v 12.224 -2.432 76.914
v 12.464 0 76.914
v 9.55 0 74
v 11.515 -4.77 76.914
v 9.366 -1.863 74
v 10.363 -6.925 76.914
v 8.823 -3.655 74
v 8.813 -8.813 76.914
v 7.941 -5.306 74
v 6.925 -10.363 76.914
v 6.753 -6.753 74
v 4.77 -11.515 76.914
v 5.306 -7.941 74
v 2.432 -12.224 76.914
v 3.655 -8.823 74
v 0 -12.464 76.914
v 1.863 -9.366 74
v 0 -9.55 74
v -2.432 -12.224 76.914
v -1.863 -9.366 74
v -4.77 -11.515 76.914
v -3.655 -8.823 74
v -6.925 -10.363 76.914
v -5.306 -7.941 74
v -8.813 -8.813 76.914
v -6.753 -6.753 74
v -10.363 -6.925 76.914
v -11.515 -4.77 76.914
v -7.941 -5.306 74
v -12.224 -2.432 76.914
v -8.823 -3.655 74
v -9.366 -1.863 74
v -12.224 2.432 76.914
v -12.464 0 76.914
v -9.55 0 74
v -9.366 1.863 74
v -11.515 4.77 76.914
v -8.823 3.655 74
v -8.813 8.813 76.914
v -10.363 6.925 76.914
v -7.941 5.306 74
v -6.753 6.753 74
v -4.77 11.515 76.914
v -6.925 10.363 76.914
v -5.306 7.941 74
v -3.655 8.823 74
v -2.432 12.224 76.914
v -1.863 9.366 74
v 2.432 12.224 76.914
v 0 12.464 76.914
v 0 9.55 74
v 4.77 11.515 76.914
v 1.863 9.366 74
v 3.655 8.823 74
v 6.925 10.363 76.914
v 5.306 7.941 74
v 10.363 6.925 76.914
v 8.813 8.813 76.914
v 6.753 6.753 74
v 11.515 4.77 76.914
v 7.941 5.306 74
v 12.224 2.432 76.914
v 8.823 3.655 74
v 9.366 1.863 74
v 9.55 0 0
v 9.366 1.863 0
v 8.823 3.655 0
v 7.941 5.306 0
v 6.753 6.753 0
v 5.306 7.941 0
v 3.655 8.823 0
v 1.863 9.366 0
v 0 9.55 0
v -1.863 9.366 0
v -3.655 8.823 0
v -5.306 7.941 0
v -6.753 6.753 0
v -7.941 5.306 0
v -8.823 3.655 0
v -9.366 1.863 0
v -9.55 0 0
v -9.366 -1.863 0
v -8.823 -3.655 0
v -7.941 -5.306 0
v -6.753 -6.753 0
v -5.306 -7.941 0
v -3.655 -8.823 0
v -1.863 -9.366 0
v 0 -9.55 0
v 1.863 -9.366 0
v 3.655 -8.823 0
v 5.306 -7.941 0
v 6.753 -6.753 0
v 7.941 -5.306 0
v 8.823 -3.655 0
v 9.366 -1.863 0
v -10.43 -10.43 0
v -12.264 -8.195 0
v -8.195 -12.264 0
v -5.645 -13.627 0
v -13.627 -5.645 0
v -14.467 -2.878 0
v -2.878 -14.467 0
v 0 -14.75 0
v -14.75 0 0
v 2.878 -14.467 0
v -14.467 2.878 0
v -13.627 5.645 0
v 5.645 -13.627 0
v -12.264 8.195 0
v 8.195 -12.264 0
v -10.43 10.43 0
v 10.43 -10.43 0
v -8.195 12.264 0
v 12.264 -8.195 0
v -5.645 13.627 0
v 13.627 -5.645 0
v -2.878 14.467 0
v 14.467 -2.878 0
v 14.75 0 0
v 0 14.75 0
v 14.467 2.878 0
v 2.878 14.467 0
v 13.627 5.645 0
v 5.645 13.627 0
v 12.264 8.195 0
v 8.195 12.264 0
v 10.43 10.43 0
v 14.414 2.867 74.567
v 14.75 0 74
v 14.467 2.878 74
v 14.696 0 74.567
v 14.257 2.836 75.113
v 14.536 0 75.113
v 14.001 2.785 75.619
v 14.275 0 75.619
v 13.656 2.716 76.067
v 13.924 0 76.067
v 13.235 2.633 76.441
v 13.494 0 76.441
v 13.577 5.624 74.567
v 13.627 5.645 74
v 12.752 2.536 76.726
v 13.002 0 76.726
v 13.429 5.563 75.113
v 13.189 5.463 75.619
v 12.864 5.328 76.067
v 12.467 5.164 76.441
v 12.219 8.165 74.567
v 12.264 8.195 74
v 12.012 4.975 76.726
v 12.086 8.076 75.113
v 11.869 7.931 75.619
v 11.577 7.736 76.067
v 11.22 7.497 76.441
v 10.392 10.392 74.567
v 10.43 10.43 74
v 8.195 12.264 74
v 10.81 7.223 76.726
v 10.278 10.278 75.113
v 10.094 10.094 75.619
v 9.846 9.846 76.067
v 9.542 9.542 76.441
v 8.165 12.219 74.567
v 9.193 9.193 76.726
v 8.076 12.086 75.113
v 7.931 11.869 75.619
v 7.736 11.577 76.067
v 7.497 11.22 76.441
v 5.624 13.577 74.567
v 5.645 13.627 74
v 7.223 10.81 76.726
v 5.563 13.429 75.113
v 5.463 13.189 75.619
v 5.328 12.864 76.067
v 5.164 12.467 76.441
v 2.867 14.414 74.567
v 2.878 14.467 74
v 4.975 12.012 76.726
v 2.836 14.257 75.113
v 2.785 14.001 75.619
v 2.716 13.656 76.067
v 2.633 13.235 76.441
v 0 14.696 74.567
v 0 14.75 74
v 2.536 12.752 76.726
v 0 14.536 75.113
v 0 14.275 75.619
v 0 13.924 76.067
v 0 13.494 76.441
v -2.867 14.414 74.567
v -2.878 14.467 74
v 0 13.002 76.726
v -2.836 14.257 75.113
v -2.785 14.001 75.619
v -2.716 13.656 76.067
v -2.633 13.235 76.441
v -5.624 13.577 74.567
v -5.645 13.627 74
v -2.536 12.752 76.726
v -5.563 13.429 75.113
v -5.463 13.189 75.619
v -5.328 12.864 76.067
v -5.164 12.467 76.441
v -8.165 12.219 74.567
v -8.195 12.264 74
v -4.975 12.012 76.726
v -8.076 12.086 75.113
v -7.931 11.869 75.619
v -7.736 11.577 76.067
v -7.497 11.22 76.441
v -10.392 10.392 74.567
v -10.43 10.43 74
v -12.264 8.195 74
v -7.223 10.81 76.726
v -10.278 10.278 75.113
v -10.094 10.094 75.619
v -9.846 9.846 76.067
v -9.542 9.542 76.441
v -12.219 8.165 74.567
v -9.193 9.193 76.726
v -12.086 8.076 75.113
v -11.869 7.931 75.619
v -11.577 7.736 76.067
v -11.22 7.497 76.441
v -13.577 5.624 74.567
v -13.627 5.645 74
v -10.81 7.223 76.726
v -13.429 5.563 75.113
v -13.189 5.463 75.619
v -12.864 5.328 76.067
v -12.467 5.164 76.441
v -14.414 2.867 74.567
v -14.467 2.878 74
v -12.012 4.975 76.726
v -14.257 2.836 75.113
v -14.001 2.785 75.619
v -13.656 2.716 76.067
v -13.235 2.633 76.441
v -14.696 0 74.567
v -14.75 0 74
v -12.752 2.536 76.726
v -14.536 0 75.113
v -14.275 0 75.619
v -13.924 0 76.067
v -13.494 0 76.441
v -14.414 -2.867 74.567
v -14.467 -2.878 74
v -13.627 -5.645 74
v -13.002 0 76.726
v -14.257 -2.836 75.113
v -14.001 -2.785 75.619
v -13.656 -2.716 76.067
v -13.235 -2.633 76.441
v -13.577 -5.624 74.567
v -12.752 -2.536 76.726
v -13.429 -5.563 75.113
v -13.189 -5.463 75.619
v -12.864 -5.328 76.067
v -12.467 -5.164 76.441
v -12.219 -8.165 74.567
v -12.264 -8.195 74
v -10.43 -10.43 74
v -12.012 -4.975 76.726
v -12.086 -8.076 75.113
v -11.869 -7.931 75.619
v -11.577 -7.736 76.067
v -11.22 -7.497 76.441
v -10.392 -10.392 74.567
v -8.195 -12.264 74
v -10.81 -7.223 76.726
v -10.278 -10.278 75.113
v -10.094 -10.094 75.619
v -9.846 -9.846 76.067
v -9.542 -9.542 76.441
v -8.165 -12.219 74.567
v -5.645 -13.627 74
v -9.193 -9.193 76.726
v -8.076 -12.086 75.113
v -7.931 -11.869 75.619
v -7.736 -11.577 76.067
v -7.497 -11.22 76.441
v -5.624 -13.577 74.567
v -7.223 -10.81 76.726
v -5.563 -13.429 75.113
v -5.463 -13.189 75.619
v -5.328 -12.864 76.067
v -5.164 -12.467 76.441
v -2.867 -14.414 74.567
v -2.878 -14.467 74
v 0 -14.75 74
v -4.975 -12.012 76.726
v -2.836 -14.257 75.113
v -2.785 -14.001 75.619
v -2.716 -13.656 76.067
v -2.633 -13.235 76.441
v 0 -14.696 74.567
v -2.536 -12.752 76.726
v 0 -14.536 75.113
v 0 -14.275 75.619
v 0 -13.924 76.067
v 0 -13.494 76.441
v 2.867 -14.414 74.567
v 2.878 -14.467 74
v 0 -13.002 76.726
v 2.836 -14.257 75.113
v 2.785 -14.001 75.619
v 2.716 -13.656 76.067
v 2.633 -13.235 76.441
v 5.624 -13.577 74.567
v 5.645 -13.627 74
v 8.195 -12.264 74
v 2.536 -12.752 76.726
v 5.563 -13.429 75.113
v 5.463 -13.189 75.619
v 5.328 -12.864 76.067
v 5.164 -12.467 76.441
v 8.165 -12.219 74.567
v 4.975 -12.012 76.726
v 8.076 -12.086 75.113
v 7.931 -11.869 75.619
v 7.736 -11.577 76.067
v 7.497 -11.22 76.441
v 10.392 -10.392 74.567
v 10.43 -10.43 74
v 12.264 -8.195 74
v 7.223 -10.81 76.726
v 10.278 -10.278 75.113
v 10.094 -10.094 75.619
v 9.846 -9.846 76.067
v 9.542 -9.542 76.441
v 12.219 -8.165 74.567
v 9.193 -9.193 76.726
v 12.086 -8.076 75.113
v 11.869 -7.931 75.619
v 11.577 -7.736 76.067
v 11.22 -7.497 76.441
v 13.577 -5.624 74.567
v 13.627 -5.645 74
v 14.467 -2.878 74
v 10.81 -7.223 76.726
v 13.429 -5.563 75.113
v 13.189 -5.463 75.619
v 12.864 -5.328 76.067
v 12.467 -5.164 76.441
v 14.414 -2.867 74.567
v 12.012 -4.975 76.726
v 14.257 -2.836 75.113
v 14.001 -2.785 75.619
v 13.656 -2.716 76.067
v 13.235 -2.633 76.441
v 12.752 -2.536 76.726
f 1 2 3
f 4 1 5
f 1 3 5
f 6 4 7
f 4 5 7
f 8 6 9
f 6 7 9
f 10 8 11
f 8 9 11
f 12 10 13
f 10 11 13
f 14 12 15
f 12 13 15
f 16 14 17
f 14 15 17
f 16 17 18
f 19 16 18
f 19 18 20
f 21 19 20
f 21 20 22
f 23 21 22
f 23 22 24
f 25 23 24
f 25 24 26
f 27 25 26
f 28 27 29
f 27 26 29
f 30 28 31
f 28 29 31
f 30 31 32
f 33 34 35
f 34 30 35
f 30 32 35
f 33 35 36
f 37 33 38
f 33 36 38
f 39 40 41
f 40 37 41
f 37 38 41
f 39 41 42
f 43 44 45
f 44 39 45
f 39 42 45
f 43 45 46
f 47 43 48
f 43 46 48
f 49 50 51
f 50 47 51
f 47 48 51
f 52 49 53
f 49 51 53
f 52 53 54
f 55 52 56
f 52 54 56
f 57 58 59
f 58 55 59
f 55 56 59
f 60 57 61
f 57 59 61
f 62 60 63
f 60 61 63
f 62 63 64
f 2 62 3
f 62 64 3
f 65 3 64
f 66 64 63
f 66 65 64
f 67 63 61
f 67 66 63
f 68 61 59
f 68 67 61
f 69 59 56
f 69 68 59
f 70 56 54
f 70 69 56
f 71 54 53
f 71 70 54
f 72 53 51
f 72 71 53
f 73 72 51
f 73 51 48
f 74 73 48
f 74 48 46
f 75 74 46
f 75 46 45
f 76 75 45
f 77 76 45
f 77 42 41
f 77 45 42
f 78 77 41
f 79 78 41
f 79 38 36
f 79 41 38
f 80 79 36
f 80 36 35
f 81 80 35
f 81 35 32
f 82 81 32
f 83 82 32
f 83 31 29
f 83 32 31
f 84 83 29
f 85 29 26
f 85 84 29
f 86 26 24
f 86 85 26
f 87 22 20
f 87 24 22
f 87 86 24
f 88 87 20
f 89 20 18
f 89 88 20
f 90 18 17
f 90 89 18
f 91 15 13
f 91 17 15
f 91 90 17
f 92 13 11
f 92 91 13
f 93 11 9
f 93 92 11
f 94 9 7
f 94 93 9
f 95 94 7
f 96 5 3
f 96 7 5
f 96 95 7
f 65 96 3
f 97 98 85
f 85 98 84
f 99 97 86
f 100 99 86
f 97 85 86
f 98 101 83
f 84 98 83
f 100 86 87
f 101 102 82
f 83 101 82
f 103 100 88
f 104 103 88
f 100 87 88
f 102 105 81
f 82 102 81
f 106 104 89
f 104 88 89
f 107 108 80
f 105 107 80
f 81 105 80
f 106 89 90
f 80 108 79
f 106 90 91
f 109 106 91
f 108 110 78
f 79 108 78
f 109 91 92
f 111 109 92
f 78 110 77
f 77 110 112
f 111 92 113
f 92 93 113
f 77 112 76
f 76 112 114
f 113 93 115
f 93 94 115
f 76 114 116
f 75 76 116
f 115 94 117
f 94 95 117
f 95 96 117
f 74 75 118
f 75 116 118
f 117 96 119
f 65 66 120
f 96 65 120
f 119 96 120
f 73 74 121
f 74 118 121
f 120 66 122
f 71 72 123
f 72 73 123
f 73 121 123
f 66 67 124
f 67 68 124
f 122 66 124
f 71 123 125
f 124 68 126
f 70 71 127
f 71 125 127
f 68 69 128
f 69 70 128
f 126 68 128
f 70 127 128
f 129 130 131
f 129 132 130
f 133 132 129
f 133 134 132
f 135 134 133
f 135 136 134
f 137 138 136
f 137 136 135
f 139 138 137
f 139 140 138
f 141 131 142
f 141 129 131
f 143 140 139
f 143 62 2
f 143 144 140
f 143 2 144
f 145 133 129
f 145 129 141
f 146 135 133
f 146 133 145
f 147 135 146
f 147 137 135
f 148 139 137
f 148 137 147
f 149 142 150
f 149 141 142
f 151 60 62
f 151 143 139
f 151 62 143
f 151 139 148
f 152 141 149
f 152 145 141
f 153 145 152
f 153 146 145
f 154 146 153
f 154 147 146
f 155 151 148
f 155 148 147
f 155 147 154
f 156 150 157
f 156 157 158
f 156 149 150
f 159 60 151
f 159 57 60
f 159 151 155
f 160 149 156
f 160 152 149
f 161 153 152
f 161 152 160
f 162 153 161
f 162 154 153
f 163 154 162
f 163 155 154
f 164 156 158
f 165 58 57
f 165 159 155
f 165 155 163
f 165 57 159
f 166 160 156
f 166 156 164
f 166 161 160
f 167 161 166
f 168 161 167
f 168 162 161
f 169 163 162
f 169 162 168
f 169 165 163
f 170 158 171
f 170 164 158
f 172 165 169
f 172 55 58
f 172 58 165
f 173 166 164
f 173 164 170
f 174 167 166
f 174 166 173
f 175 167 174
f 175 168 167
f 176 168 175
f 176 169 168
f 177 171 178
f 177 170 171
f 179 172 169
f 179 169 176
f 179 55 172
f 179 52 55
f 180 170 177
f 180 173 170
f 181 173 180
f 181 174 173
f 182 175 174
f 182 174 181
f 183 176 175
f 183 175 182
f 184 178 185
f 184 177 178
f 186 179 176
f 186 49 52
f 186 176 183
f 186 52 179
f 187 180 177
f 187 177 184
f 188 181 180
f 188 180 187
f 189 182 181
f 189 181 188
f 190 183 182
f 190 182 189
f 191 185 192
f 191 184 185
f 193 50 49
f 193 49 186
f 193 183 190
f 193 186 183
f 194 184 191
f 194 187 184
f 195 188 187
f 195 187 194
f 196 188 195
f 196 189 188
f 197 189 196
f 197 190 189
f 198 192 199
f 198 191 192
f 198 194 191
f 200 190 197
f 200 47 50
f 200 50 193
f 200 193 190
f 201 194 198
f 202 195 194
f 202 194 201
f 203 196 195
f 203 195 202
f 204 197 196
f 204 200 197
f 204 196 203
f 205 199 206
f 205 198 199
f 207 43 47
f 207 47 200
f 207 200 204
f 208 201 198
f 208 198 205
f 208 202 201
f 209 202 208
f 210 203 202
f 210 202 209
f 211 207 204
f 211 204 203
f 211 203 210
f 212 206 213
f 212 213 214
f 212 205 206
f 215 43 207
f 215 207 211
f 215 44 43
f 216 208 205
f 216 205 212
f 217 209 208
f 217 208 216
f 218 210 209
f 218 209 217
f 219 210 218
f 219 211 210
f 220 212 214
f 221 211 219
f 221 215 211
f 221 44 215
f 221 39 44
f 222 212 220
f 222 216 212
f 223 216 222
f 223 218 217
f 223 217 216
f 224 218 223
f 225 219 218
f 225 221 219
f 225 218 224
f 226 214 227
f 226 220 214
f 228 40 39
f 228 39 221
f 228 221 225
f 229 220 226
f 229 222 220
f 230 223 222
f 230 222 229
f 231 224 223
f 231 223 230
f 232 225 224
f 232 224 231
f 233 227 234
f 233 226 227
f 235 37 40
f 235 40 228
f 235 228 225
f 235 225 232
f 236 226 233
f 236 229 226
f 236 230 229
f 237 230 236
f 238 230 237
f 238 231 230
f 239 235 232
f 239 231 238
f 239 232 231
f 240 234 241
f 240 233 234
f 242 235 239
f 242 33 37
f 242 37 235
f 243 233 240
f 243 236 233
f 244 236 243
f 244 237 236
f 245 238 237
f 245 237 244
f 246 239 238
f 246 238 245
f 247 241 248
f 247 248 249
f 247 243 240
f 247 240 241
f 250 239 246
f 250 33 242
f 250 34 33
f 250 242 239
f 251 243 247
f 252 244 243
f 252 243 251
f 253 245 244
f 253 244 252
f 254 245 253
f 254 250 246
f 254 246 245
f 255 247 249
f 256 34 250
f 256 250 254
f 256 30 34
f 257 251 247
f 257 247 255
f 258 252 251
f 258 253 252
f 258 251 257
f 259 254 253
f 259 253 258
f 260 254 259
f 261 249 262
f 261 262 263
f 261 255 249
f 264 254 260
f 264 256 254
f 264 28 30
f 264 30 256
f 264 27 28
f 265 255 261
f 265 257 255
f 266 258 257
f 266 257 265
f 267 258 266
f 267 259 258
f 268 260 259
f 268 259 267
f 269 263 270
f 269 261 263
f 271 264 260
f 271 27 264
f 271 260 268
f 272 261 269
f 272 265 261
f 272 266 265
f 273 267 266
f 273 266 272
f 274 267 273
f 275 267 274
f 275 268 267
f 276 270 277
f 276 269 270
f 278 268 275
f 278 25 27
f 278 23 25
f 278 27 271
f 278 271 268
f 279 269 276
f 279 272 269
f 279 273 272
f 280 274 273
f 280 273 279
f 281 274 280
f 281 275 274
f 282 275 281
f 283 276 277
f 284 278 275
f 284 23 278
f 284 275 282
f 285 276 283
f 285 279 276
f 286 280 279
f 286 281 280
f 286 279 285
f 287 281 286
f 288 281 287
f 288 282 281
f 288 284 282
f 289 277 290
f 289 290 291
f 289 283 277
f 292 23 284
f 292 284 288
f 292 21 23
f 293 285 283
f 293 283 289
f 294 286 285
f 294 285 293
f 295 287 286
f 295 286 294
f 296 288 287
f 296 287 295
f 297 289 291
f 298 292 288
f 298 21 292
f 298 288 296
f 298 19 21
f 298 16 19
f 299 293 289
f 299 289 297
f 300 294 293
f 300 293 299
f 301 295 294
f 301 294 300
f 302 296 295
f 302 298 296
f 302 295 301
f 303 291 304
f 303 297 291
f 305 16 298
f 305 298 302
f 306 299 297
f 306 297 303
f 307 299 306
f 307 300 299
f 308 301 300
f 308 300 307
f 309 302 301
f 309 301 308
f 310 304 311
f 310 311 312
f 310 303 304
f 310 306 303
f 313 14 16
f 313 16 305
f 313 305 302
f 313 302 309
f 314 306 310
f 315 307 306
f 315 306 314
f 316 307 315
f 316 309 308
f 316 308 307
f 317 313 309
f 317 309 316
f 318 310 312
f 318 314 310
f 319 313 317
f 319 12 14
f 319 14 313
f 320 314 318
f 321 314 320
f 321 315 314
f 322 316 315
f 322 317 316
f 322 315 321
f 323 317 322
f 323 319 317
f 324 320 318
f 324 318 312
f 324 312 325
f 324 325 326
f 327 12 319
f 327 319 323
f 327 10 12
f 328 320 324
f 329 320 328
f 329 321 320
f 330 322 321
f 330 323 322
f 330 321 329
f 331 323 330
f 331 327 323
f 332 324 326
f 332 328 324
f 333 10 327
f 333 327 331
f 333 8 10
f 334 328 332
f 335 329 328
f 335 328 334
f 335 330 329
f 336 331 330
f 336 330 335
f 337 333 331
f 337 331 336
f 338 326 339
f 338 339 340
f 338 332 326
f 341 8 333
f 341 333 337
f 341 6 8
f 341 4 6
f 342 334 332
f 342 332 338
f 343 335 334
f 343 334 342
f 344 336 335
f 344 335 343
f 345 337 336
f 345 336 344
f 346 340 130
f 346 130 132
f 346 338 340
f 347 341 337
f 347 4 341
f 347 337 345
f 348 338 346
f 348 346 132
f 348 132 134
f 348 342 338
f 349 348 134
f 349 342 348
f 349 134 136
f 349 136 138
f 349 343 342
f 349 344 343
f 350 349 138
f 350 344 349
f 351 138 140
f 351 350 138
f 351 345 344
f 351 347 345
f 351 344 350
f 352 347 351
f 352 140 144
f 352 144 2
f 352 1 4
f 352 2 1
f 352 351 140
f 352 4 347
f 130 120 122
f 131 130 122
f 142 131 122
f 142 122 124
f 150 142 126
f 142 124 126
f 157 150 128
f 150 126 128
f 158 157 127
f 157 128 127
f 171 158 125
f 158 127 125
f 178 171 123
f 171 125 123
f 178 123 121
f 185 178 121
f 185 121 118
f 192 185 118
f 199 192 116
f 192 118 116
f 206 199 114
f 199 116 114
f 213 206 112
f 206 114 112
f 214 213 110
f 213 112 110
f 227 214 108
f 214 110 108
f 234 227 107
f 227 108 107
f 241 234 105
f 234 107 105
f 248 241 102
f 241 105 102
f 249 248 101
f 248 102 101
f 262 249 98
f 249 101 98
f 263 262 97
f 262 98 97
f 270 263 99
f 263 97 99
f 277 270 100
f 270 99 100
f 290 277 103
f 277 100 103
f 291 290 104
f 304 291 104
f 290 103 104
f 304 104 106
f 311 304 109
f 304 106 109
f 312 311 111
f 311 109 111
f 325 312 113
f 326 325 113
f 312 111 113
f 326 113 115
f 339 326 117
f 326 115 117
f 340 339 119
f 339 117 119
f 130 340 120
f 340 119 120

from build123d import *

# Parameters (mm, degrees)
F0_R     = 14.75
F1_DEPTH = 77
F2_R     = 9.55
F3_DEPTH = 77.001
F4_R     = 3


# Not quite as in the source:
# - a fillet or chamfer that OpenCascade refuses, or shapes differently, is made with other operations: its cross-section is extruded or revolved along the edge and cut away or added


with BuildPart() as f1:
    # F0 (on Top) → F1 (new body)
    with BuildSketch(Plane.XY):
        Circle(F0_R)
    extrude(amount=F1_DEPTH)

    # F2 (on Top) → F3 (cut, through all)
    with BuildSketch(Plane.XY):
        Circle(F2_R)
    extrude(amount=F3_DEPTH, mode=Mode.SUBTRACT)

    # F4
    f4_edges = [f1.edges().sort_by_distance(p)[0] for p in [
        (-14.75, 0, 77),
    ]]
    fillet(f4_edges, radius=F4_R)

    # F5: chamfer of 3 on 1 edges, made by hand

    # F5_s1 → F5_t2 (revolve, cut)
    with BuildSketch(Plane.XZ):
        Polygon((12.55, 77), (9.55, 74), (9.55, 77), align=None)
    revolve(axis=Axis((0, 0, 77), (0, 0, -1)), mode=Mode.SUBTRACT)


solid = f1.part
